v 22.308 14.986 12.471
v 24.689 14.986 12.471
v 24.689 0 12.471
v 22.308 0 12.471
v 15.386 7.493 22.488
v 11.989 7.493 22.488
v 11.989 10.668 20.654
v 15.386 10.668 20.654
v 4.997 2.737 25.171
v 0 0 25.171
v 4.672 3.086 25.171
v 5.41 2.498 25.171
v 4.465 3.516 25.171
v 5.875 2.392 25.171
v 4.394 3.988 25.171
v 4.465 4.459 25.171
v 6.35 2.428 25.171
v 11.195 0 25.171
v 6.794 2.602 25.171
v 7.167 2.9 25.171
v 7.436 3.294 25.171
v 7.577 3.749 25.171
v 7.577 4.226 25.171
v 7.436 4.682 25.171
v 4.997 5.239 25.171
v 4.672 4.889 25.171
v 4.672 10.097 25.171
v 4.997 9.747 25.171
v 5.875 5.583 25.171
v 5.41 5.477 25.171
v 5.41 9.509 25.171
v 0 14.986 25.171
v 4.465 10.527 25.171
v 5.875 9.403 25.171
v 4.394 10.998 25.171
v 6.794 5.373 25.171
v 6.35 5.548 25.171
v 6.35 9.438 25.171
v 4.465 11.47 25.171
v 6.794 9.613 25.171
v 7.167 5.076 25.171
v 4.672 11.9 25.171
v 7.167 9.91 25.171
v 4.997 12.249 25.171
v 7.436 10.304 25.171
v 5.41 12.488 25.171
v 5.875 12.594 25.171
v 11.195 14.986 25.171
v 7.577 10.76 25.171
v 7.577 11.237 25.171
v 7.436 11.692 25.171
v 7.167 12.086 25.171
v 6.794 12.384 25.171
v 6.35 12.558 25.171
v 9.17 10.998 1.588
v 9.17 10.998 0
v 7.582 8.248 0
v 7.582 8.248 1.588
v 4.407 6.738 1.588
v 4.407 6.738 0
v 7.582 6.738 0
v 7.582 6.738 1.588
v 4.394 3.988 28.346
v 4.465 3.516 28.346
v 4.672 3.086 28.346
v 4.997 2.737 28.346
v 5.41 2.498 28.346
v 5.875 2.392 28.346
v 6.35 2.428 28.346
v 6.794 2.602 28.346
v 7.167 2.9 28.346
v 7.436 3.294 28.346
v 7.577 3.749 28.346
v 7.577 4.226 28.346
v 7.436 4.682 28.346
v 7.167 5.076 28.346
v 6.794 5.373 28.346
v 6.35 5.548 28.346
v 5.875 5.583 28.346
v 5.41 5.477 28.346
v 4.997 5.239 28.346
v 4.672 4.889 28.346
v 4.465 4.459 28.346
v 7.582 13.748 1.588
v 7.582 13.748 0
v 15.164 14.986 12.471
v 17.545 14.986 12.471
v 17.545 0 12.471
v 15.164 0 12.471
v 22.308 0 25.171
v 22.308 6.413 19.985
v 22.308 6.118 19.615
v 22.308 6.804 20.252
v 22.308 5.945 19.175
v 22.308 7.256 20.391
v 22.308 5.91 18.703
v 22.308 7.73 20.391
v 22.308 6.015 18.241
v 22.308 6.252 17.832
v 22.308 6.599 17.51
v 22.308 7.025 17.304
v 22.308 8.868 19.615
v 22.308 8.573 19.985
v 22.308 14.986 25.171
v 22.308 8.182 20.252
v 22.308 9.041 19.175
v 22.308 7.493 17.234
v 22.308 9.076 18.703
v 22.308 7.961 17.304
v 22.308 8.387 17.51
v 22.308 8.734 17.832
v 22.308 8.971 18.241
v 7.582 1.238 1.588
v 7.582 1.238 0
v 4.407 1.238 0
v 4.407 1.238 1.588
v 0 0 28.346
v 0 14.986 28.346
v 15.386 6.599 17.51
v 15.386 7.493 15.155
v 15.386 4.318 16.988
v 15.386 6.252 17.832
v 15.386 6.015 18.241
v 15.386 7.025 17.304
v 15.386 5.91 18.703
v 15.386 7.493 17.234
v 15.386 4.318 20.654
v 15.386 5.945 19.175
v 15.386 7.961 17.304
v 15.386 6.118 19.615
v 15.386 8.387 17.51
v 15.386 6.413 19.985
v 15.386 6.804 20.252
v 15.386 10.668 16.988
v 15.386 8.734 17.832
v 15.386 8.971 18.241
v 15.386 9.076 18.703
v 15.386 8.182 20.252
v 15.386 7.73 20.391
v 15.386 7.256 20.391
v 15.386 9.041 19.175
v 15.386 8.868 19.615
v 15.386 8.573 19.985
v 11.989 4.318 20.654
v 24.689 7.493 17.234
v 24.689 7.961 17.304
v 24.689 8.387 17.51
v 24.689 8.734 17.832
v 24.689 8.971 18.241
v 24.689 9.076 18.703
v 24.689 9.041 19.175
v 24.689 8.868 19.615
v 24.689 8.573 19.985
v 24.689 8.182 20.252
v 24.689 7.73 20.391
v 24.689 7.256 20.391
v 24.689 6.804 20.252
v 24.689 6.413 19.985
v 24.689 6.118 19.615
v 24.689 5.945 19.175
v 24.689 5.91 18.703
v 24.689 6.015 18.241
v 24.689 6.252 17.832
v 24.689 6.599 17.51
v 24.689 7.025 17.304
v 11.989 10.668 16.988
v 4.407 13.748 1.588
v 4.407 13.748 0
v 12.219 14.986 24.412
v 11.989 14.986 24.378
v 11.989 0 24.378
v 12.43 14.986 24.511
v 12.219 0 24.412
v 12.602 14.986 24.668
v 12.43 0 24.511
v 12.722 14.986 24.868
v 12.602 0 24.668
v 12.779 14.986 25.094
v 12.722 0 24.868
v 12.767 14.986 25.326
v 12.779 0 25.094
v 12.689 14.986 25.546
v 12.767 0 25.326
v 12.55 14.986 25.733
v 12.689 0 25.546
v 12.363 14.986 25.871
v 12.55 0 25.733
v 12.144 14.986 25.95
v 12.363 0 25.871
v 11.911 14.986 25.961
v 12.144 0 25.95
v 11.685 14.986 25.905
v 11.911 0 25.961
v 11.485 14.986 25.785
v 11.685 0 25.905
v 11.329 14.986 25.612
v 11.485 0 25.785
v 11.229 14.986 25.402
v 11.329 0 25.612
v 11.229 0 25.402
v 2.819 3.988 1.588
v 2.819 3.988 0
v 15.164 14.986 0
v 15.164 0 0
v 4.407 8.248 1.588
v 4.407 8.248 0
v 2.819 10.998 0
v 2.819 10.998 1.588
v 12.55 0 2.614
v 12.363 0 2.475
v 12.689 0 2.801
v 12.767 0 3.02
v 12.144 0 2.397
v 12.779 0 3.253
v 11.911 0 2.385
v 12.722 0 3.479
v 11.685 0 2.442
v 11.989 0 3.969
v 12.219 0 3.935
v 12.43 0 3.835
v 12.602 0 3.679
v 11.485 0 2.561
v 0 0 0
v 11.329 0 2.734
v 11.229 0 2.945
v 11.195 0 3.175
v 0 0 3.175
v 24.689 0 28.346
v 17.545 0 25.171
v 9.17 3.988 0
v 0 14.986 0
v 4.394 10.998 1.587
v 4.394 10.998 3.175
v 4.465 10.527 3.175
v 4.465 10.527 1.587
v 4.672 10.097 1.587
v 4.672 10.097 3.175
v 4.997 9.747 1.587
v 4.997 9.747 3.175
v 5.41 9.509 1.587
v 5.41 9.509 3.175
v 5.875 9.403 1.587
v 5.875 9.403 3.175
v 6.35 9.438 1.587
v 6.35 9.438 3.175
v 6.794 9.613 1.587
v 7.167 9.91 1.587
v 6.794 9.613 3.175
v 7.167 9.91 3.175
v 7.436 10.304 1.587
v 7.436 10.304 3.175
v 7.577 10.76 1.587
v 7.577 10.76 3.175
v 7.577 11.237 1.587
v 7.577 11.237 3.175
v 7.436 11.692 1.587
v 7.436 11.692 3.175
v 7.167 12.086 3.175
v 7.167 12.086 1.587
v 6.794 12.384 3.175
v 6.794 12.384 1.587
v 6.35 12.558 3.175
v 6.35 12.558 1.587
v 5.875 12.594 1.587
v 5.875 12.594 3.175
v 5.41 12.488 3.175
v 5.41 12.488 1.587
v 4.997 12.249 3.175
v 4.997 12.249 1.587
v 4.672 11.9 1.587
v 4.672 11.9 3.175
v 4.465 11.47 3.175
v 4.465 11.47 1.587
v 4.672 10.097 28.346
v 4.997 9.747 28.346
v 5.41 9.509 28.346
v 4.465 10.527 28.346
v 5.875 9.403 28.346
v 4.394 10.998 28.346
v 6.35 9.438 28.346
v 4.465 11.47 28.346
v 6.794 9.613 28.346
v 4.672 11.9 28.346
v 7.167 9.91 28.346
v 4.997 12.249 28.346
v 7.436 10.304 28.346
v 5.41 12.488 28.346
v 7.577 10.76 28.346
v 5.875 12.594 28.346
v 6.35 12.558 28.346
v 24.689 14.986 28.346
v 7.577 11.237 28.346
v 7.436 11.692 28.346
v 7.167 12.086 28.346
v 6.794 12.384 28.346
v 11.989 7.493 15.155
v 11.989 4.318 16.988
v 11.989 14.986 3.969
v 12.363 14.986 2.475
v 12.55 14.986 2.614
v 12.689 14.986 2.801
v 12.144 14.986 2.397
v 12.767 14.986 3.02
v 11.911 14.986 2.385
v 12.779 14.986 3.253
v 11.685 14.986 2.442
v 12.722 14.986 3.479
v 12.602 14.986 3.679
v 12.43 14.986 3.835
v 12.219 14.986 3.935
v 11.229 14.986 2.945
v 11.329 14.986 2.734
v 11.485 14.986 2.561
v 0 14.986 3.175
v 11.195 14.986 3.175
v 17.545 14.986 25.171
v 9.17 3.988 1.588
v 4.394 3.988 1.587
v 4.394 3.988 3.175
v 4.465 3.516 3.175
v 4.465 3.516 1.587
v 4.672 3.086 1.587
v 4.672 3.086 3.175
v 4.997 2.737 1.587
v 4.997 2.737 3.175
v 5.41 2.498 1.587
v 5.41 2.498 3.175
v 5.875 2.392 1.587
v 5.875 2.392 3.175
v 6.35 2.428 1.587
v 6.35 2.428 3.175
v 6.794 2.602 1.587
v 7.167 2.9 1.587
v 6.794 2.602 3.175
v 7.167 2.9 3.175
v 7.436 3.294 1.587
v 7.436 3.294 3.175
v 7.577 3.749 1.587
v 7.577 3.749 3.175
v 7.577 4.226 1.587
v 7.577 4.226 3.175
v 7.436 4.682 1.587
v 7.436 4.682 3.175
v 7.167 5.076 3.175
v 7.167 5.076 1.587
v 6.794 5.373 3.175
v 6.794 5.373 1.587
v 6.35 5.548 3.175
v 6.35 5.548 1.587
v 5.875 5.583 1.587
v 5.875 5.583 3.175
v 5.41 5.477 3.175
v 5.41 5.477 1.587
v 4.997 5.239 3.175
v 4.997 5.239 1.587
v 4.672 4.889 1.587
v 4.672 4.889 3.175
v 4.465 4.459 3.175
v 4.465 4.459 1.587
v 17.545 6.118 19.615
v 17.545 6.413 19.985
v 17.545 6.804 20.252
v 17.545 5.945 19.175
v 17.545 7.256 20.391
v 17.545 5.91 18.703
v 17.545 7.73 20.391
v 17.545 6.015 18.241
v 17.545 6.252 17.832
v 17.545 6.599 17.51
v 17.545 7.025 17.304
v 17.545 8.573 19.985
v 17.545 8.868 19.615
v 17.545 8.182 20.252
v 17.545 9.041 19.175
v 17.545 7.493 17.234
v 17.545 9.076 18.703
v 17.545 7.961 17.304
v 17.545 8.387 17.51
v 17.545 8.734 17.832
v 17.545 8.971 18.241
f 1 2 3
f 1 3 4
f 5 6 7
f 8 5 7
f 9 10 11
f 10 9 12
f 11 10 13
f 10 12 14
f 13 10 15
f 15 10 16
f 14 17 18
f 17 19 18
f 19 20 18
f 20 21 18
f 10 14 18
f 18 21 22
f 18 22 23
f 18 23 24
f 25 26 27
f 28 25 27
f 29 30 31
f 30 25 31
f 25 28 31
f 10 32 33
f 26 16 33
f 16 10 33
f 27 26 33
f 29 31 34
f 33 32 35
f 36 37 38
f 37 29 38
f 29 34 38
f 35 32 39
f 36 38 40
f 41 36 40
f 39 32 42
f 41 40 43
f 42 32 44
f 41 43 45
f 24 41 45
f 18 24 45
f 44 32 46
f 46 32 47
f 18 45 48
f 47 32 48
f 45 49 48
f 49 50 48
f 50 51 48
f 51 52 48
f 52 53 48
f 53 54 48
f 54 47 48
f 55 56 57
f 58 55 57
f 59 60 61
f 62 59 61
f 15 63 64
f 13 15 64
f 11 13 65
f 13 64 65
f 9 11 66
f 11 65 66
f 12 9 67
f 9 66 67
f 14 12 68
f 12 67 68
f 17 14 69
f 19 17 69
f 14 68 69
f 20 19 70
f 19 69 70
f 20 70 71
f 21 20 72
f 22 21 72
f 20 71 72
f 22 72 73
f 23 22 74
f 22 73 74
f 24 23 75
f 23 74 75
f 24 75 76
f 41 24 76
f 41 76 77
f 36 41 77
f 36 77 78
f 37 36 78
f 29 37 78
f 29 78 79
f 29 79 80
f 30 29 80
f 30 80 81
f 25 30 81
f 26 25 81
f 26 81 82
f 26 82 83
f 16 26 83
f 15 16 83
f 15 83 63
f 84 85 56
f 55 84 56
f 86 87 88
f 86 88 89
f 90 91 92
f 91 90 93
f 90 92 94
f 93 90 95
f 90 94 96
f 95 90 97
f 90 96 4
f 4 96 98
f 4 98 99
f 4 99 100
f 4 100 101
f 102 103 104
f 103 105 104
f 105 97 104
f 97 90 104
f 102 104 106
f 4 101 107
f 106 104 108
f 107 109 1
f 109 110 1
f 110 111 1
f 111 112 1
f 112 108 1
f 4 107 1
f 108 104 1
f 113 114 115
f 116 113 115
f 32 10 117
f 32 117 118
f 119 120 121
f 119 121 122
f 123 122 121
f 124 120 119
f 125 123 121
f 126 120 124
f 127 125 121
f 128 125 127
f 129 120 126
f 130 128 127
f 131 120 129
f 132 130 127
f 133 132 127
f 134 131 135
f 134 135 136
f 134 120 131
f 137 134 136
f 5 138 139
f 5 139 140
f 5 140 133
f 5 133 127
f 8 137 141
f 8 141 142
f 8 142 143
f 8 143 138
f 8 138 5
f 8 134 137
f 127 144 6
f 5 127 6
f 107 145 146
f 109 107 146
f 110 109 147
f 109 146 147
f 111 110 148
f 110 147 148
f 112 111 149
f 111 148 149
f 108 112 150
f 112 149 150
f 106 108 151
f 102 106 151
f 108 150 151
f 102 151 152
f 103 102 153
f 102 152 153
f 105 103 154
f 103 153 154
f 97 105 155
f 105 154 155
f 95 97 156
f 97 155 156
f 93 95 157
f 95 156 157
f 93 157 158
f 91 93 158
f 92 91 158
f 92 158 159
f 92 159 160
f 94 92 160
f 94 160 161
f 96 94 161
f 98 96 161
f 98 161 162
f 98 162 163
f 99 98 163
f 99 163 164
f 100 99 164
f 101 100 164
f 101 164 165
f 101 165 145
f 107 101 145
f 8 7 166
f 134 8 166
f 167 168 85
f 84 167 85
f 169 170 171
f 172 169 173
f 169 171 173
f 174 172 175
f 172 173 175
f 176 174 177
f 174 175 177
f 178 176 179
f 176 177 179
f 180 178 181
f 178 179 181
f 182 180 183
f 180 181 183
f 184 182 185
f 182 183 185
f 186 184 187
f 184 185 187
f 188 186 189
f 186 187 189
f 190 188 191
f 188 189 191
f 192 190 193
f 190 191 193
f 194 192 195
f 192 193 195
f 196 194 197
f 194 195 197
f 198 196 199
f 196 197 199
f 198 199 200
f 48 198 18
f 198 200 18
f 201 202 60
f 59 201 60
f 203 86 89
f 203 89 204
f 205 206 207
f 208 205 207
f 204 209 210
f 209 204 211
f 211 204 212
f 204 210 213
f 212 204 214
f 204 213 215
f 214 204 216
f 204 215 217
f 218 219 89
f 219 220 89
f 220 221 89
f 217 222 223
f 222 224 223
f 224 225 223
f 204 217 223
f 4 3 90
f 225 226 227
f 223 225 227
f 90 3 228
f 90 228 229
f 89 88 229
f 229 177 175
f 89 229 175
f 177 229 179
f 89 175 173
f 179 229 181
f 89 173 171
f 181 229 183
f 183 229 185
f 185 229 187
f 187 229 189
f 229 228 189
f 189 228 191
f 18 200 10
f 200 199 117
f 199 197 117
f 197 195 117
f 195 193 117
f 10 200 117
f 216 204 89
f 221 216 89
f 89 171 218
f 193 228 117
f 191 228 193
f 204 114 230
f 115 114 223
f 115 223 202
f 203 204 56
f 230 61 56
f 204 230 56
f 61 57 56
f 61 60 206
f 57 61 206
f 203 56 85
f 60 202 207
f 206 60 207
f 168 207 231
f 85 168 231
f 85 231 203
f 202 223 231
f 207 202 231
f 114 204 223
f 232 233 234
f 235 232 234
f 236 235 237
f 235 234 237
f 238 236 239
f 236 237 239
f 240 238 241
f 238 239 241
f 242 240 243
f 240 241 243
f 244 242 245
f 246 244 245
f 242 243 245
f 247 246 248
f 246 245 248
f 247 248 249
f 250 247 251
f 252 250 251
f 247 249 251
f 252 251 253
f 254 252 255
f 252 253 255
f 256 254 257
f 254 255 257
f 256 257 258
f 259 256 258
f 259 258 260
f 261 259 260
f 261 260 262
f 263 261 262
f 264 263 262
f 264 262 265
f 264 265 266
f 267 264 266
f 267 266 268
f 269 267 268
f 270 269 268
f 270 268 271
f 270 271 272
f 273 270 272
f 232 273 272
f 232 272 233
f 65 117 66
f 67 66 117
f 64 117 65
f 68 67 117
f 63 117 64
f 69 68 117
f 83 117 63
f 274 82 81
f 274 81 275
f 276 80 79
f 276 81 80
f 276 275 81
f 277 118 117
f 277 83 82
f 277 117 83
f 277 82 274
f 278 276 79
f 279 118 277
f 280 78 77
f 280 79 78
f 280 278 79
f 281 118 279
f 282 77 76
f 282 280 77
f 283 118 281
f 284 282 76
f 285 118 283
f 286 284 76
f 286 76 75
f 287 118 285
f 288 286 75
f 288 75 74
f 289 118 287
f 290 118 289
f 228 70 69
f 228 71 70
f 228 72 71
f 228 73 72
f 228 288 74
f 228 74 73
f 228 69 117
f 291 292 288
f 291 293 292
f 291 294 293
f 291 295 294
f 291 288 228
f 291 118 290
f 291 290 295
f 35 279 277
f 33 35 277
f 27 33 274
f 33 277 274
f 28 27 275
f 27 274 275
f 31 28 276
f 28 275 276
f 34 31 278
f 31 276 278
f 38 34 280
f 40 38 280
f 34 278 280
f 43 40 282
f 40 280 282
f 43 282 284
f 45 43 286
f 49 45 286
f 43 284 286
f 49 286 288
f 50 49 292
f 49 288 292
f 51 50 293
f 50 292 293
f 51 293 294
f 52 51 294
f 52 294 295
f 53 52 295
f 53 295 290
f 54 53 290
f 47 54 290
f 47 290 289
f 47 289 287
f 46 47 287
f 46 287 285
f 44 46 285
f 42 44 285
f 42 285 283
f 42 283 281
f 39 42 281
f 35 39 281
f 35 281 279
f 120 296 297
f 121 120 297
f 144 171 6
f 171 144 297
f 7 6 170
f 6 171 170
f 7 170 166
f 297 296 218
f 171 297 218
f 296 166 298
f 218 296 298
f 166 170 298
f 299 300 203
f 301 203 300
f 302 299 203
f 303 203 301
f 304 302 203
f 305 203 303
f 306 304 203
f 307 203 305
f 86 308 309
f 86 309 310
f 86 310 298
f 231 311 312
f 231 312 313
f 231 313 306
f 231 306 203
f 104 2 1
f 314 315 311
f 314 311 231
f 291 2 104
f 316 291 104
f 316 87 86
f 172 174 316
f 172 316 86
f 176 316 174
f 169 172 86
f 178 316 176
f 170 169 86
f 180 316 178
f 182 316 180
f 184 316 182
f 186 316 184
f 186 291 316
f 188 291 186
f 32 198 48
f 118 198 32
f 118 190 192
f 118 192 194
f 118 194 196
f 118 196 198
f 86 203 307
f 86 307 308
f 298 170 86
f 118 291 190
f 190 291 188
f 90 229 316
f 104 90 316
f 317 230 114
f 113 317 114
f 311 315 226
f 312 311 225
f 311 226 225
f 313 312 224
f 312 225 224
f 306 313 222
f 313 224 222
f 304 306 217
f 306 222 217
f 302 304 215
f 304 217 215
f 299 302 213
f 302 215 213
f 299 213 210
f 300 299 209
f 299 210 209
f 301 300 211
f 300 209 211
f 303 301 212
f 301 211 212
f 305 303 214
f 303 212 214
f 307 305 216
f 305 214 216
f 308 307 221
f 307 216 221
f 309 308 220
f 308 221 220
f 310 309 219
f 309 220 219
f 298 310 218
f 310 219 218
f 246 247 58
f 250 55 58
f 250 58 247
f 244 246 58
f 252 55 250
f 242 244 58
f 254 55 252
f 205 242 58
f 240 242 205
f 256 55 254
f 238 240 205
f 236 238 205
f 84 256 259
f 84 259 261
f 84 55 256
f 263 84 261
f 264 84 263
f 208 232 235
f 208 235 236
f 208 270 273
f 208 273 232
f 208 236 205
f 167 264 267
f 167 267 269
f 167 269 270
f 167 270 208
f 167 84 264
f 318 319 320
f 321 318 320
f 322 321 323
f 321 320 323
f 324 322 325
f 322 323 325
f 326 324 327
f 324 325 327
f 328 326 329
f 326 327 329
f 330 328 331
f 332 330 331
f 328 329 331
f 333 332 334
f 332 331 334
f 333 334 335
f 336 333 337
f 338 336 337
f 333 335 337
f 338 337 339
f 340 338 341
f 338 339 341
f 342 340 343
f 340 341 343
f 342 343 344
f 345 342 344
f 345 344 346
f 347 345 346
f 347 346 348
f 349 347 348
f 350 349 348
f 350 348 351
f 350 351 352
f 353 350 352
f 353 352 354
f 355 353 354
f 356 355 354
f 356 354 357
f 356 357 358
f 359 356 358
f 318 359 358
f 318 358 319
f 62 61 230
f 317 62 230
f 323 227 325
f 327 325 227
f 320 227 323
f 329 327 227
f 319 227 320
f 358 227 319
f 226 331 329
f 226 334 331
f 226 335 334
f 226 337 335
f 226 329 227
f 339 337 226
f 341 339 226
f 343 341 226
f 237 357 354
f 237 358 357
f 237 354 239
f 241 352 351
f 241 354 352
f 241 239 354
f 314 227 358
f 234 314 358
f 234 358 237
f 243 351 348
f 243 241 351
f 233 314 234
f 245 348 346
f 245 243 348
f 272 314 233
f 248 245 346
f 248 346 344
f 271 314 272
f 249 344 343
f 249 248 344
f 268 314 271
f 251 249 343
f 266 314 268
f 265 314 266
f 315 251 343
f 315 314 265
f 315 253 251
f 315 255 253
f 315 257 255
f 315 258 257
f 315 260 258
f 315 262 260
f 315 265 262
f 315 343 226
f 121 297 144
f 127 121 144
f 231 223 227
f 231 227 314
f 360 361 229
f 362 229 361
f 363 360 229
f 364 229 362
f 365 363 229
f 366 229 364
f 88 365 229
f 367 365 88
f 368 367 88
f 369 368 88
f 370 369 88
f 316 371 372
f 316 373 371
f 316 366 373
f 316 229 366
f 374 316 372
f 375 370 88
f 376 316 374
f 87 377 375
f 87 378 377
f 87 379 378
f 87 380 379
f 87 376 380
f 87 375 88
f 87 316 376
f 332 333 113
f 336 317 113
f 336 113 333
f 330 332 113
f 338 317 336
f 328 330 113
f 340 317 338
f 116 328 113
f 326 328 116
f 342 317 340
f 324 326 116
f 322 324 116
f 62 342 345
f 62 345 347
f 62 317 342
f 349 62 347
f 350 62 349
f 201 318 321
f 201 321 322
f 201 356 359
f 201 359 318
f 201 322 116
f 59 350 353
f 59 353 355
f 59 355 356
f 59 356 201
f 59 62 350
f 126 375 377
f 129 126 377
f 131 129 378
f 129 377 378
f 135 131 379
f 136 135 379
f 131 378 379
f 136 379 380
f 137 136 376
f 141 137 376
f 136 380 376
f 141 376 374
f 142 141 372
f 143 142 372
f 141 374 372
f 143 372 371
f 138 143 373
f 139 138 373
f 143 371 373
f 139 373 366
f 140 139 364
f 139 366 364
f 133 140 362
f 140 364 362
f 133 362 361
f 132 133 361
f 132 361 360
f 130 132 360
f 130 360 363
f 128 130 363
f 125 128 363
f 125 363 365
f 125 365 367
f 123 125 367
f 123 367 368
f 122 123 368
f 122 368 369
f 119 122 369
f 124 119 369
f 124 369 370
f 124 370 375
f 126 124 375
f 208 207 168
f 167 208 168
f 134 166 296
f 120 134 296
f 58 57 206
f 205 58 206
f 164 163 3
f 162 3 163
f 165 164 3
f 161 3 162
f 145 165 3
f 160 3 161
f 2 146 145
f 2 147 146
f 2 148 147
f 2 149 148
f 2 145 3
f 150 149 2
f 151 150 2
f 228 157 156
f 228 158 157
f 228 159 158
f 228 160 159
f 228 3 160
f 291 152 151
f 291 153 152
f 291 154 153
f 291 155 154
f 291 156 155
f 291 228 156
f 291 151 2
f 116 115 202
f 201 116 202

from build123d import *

# Parameters (mm, degrees)
SKETCH1_W               = 11.9888
SKETCH1_H               = 14.986
BOSS_EXTRUDE1_DEPTH     = 3.175
SKETCH6_W               = 25.1714
SKETCH6_H               = 14.986
BOSS_EXTRUDE6_DEPTH     = 3.175
SKETCH10_W              = 24.6888
SKETCH10_H              = 14.986
BOSS_EXTRUDE7_DEPTH     = 3.175
M3_CLEARANCE_HOLE1_D    = 3.2
SKETCH15_R              = 0.79375
CUT_EXTRUDE5_DEPTH      = 41.467708539
CUT_EXTRUDE6_DEPTH      = 1.5875
SKETCH17_W              = 9.525
SKETCH17_H              = 14.986
BOSS_EXTRUDE8_DEPTH     = 12.7
CUT_EXTRUDE7_DEPTH      = 2.38125
CUT_EXTRUDE7_DEPTH_BACK = 2.38125
SKETCH19_W              = 12.7
SKETCH19_H              = 14.986
SKETCH20_R              = 1.5875
CUT_EXTRUDE8_DEPTH      = 16.60525
CUT_EXTRUDE9_DEPTH      = 3.39725


with BuildPart() as part:
    # Sketch1 → Boss-Extrude1 (new body)
    with BuildSketch(Plane.XY):
        with Locations((5.9944, 7.493)):
            Rectangle(SKETCH1_W, SKETCH1_H)
    extrude(amount=BOSS_EXTRUDE1_DEPTH)

    # Sketch6 → Boss-Extrude6 (add)
    with BuildSketch(Plane(origin=(11.9888, 0, 0), x_dir=(0, 0, -1), z_dir=(1, 0, 0))):
        with Locations((-12.5857, 7.493)):
            Rectangle(SKETCH6_W, SKETCH6_H)
    extrude(amount=BOSS_EXTRUDE6_DEPTH)

    # Sketch10 → Boss-Extrude7 (add)
    with BuildSketch(Plane.XY.offset(25.1714)):
        with Locations((12.3444, 7.493)):
            Rectangle(SKETCH10_W, SKETCH10_H)
    extrude(amount=BOSS_EXTRUDE7_DEPTH)

    # M3 Clearance Hole1 (through all)
    with Locations(Plane(origin=(-0.089803774, -1.114373232, 0), x_dir=(1, 0, 0), z_dir=(0, 0, -1))):
        with Locations((6.084203774, -12.112573232), (6.084203774, -5.102173232)):
            Hole(M3_CLEARANCE_HOLE1_D / 2)

    # Sketch15 → Cut-Extrude5 (cut, through all)
    with BuildSketch(Plane.XZ):
        with Locations((11.9888, 25.1714)):
            Circle(SKETCH15_R)
        with Locations((11.9888, 3.175)):
            Circle(SKETCH15_R)
    extrude(amount=-CUT_EXTRUDE5_DEPTH, mode=Mode.SUBTRACT)

    # Sketch16 → Cut-Extrude6 (cut)
    with BuildSketch(Plane(origin=(0, 0, 0), x_dir=(-1, 0, 0), z_dir=(0, 0, -1))):
        Polygon((-4.40668676, 6.7378), (-7.58211324, 6.7378), (-9.169826481, 3.9878), (-7.58211324, 1.2378), (-4.40668676, 1.2378), (-2.818973519, 3.9878), align=None)
        Polygon((-4.40668676, 13.7482), (-7.58211324, 13.7482), (-9.169826481, 10.9982), (-7.58211324, 8.2482), (-4.40668676, 8.2482), (-2.818973519, 10.9982), align=None)
    extrude(amount=-CUT_EXTRUDE6_DEPTH, mode=Mode.SUBTRACT)

    # Sketch17 → Boss-Extrude8 (add)
    with BuildSketch(Plane(origin=(0, 0, 25.1714), x_dir=(-1, 0, 0), z_dir=(0, 0, -1))):
        with Locations((-19.9263, 7.493)):
            Rectangle(SKETCH17_W, SKETCH17_H)
    extrude(amount=BOSS_EXTRUDE8_DEPTH)

    # Sketch19 → Cut-Extrude7 (cut, two sides: drawn at the far end of the back side and taken through both)
    with BuildSketch(Plane(origin=(19.9263, 0, 0), x_dir=(0, 0, -1), z_dir=(1, 0, 0)).offset(-CUT_EXTRUDE7_DEPTH_BACK)):
        with Locations((-18.8214, 7.493)):
            Rectangle(SKETCH19_W, SKETCH19_H)
    extrude(amount=CUT_EXTRUDE7_DEPTH + CUT_EXTRUDE7_DEPTH_BACK, mode=Mode.SUBTRACT)

    # Sketch20 → Cut-Extrude8 (cut)
    with BuildSketch(Plane(origin=(24.6888, 0, 0), x_dir=(0, 0, -1), z_dir=(1, 0, 0))):
        with Locations((-18.8214, 7.493)):
            Circle(SKETCH20_R)
    extrude(amount=-CUT_EXTRUDE8_DEPTH, mode=Mode.SUBTRACT)

    # Sketch21 → Cut-Extrude9 (cut)
    with BuildSketch(Plane.ZY.offset(-11.9888)):
        Polygon((22.487574209, 7.493), (20.654487105, 10.668), (16.988312895, 10.668), (15.155225791, 7.493), (16.988312895, 4.318), (20.654487105, 4.318), align=None)
    extrude(amount=-CUT_EXTRUDE9_DEPTH, mode=Mode.SUBTRACT)


solid = part.part
